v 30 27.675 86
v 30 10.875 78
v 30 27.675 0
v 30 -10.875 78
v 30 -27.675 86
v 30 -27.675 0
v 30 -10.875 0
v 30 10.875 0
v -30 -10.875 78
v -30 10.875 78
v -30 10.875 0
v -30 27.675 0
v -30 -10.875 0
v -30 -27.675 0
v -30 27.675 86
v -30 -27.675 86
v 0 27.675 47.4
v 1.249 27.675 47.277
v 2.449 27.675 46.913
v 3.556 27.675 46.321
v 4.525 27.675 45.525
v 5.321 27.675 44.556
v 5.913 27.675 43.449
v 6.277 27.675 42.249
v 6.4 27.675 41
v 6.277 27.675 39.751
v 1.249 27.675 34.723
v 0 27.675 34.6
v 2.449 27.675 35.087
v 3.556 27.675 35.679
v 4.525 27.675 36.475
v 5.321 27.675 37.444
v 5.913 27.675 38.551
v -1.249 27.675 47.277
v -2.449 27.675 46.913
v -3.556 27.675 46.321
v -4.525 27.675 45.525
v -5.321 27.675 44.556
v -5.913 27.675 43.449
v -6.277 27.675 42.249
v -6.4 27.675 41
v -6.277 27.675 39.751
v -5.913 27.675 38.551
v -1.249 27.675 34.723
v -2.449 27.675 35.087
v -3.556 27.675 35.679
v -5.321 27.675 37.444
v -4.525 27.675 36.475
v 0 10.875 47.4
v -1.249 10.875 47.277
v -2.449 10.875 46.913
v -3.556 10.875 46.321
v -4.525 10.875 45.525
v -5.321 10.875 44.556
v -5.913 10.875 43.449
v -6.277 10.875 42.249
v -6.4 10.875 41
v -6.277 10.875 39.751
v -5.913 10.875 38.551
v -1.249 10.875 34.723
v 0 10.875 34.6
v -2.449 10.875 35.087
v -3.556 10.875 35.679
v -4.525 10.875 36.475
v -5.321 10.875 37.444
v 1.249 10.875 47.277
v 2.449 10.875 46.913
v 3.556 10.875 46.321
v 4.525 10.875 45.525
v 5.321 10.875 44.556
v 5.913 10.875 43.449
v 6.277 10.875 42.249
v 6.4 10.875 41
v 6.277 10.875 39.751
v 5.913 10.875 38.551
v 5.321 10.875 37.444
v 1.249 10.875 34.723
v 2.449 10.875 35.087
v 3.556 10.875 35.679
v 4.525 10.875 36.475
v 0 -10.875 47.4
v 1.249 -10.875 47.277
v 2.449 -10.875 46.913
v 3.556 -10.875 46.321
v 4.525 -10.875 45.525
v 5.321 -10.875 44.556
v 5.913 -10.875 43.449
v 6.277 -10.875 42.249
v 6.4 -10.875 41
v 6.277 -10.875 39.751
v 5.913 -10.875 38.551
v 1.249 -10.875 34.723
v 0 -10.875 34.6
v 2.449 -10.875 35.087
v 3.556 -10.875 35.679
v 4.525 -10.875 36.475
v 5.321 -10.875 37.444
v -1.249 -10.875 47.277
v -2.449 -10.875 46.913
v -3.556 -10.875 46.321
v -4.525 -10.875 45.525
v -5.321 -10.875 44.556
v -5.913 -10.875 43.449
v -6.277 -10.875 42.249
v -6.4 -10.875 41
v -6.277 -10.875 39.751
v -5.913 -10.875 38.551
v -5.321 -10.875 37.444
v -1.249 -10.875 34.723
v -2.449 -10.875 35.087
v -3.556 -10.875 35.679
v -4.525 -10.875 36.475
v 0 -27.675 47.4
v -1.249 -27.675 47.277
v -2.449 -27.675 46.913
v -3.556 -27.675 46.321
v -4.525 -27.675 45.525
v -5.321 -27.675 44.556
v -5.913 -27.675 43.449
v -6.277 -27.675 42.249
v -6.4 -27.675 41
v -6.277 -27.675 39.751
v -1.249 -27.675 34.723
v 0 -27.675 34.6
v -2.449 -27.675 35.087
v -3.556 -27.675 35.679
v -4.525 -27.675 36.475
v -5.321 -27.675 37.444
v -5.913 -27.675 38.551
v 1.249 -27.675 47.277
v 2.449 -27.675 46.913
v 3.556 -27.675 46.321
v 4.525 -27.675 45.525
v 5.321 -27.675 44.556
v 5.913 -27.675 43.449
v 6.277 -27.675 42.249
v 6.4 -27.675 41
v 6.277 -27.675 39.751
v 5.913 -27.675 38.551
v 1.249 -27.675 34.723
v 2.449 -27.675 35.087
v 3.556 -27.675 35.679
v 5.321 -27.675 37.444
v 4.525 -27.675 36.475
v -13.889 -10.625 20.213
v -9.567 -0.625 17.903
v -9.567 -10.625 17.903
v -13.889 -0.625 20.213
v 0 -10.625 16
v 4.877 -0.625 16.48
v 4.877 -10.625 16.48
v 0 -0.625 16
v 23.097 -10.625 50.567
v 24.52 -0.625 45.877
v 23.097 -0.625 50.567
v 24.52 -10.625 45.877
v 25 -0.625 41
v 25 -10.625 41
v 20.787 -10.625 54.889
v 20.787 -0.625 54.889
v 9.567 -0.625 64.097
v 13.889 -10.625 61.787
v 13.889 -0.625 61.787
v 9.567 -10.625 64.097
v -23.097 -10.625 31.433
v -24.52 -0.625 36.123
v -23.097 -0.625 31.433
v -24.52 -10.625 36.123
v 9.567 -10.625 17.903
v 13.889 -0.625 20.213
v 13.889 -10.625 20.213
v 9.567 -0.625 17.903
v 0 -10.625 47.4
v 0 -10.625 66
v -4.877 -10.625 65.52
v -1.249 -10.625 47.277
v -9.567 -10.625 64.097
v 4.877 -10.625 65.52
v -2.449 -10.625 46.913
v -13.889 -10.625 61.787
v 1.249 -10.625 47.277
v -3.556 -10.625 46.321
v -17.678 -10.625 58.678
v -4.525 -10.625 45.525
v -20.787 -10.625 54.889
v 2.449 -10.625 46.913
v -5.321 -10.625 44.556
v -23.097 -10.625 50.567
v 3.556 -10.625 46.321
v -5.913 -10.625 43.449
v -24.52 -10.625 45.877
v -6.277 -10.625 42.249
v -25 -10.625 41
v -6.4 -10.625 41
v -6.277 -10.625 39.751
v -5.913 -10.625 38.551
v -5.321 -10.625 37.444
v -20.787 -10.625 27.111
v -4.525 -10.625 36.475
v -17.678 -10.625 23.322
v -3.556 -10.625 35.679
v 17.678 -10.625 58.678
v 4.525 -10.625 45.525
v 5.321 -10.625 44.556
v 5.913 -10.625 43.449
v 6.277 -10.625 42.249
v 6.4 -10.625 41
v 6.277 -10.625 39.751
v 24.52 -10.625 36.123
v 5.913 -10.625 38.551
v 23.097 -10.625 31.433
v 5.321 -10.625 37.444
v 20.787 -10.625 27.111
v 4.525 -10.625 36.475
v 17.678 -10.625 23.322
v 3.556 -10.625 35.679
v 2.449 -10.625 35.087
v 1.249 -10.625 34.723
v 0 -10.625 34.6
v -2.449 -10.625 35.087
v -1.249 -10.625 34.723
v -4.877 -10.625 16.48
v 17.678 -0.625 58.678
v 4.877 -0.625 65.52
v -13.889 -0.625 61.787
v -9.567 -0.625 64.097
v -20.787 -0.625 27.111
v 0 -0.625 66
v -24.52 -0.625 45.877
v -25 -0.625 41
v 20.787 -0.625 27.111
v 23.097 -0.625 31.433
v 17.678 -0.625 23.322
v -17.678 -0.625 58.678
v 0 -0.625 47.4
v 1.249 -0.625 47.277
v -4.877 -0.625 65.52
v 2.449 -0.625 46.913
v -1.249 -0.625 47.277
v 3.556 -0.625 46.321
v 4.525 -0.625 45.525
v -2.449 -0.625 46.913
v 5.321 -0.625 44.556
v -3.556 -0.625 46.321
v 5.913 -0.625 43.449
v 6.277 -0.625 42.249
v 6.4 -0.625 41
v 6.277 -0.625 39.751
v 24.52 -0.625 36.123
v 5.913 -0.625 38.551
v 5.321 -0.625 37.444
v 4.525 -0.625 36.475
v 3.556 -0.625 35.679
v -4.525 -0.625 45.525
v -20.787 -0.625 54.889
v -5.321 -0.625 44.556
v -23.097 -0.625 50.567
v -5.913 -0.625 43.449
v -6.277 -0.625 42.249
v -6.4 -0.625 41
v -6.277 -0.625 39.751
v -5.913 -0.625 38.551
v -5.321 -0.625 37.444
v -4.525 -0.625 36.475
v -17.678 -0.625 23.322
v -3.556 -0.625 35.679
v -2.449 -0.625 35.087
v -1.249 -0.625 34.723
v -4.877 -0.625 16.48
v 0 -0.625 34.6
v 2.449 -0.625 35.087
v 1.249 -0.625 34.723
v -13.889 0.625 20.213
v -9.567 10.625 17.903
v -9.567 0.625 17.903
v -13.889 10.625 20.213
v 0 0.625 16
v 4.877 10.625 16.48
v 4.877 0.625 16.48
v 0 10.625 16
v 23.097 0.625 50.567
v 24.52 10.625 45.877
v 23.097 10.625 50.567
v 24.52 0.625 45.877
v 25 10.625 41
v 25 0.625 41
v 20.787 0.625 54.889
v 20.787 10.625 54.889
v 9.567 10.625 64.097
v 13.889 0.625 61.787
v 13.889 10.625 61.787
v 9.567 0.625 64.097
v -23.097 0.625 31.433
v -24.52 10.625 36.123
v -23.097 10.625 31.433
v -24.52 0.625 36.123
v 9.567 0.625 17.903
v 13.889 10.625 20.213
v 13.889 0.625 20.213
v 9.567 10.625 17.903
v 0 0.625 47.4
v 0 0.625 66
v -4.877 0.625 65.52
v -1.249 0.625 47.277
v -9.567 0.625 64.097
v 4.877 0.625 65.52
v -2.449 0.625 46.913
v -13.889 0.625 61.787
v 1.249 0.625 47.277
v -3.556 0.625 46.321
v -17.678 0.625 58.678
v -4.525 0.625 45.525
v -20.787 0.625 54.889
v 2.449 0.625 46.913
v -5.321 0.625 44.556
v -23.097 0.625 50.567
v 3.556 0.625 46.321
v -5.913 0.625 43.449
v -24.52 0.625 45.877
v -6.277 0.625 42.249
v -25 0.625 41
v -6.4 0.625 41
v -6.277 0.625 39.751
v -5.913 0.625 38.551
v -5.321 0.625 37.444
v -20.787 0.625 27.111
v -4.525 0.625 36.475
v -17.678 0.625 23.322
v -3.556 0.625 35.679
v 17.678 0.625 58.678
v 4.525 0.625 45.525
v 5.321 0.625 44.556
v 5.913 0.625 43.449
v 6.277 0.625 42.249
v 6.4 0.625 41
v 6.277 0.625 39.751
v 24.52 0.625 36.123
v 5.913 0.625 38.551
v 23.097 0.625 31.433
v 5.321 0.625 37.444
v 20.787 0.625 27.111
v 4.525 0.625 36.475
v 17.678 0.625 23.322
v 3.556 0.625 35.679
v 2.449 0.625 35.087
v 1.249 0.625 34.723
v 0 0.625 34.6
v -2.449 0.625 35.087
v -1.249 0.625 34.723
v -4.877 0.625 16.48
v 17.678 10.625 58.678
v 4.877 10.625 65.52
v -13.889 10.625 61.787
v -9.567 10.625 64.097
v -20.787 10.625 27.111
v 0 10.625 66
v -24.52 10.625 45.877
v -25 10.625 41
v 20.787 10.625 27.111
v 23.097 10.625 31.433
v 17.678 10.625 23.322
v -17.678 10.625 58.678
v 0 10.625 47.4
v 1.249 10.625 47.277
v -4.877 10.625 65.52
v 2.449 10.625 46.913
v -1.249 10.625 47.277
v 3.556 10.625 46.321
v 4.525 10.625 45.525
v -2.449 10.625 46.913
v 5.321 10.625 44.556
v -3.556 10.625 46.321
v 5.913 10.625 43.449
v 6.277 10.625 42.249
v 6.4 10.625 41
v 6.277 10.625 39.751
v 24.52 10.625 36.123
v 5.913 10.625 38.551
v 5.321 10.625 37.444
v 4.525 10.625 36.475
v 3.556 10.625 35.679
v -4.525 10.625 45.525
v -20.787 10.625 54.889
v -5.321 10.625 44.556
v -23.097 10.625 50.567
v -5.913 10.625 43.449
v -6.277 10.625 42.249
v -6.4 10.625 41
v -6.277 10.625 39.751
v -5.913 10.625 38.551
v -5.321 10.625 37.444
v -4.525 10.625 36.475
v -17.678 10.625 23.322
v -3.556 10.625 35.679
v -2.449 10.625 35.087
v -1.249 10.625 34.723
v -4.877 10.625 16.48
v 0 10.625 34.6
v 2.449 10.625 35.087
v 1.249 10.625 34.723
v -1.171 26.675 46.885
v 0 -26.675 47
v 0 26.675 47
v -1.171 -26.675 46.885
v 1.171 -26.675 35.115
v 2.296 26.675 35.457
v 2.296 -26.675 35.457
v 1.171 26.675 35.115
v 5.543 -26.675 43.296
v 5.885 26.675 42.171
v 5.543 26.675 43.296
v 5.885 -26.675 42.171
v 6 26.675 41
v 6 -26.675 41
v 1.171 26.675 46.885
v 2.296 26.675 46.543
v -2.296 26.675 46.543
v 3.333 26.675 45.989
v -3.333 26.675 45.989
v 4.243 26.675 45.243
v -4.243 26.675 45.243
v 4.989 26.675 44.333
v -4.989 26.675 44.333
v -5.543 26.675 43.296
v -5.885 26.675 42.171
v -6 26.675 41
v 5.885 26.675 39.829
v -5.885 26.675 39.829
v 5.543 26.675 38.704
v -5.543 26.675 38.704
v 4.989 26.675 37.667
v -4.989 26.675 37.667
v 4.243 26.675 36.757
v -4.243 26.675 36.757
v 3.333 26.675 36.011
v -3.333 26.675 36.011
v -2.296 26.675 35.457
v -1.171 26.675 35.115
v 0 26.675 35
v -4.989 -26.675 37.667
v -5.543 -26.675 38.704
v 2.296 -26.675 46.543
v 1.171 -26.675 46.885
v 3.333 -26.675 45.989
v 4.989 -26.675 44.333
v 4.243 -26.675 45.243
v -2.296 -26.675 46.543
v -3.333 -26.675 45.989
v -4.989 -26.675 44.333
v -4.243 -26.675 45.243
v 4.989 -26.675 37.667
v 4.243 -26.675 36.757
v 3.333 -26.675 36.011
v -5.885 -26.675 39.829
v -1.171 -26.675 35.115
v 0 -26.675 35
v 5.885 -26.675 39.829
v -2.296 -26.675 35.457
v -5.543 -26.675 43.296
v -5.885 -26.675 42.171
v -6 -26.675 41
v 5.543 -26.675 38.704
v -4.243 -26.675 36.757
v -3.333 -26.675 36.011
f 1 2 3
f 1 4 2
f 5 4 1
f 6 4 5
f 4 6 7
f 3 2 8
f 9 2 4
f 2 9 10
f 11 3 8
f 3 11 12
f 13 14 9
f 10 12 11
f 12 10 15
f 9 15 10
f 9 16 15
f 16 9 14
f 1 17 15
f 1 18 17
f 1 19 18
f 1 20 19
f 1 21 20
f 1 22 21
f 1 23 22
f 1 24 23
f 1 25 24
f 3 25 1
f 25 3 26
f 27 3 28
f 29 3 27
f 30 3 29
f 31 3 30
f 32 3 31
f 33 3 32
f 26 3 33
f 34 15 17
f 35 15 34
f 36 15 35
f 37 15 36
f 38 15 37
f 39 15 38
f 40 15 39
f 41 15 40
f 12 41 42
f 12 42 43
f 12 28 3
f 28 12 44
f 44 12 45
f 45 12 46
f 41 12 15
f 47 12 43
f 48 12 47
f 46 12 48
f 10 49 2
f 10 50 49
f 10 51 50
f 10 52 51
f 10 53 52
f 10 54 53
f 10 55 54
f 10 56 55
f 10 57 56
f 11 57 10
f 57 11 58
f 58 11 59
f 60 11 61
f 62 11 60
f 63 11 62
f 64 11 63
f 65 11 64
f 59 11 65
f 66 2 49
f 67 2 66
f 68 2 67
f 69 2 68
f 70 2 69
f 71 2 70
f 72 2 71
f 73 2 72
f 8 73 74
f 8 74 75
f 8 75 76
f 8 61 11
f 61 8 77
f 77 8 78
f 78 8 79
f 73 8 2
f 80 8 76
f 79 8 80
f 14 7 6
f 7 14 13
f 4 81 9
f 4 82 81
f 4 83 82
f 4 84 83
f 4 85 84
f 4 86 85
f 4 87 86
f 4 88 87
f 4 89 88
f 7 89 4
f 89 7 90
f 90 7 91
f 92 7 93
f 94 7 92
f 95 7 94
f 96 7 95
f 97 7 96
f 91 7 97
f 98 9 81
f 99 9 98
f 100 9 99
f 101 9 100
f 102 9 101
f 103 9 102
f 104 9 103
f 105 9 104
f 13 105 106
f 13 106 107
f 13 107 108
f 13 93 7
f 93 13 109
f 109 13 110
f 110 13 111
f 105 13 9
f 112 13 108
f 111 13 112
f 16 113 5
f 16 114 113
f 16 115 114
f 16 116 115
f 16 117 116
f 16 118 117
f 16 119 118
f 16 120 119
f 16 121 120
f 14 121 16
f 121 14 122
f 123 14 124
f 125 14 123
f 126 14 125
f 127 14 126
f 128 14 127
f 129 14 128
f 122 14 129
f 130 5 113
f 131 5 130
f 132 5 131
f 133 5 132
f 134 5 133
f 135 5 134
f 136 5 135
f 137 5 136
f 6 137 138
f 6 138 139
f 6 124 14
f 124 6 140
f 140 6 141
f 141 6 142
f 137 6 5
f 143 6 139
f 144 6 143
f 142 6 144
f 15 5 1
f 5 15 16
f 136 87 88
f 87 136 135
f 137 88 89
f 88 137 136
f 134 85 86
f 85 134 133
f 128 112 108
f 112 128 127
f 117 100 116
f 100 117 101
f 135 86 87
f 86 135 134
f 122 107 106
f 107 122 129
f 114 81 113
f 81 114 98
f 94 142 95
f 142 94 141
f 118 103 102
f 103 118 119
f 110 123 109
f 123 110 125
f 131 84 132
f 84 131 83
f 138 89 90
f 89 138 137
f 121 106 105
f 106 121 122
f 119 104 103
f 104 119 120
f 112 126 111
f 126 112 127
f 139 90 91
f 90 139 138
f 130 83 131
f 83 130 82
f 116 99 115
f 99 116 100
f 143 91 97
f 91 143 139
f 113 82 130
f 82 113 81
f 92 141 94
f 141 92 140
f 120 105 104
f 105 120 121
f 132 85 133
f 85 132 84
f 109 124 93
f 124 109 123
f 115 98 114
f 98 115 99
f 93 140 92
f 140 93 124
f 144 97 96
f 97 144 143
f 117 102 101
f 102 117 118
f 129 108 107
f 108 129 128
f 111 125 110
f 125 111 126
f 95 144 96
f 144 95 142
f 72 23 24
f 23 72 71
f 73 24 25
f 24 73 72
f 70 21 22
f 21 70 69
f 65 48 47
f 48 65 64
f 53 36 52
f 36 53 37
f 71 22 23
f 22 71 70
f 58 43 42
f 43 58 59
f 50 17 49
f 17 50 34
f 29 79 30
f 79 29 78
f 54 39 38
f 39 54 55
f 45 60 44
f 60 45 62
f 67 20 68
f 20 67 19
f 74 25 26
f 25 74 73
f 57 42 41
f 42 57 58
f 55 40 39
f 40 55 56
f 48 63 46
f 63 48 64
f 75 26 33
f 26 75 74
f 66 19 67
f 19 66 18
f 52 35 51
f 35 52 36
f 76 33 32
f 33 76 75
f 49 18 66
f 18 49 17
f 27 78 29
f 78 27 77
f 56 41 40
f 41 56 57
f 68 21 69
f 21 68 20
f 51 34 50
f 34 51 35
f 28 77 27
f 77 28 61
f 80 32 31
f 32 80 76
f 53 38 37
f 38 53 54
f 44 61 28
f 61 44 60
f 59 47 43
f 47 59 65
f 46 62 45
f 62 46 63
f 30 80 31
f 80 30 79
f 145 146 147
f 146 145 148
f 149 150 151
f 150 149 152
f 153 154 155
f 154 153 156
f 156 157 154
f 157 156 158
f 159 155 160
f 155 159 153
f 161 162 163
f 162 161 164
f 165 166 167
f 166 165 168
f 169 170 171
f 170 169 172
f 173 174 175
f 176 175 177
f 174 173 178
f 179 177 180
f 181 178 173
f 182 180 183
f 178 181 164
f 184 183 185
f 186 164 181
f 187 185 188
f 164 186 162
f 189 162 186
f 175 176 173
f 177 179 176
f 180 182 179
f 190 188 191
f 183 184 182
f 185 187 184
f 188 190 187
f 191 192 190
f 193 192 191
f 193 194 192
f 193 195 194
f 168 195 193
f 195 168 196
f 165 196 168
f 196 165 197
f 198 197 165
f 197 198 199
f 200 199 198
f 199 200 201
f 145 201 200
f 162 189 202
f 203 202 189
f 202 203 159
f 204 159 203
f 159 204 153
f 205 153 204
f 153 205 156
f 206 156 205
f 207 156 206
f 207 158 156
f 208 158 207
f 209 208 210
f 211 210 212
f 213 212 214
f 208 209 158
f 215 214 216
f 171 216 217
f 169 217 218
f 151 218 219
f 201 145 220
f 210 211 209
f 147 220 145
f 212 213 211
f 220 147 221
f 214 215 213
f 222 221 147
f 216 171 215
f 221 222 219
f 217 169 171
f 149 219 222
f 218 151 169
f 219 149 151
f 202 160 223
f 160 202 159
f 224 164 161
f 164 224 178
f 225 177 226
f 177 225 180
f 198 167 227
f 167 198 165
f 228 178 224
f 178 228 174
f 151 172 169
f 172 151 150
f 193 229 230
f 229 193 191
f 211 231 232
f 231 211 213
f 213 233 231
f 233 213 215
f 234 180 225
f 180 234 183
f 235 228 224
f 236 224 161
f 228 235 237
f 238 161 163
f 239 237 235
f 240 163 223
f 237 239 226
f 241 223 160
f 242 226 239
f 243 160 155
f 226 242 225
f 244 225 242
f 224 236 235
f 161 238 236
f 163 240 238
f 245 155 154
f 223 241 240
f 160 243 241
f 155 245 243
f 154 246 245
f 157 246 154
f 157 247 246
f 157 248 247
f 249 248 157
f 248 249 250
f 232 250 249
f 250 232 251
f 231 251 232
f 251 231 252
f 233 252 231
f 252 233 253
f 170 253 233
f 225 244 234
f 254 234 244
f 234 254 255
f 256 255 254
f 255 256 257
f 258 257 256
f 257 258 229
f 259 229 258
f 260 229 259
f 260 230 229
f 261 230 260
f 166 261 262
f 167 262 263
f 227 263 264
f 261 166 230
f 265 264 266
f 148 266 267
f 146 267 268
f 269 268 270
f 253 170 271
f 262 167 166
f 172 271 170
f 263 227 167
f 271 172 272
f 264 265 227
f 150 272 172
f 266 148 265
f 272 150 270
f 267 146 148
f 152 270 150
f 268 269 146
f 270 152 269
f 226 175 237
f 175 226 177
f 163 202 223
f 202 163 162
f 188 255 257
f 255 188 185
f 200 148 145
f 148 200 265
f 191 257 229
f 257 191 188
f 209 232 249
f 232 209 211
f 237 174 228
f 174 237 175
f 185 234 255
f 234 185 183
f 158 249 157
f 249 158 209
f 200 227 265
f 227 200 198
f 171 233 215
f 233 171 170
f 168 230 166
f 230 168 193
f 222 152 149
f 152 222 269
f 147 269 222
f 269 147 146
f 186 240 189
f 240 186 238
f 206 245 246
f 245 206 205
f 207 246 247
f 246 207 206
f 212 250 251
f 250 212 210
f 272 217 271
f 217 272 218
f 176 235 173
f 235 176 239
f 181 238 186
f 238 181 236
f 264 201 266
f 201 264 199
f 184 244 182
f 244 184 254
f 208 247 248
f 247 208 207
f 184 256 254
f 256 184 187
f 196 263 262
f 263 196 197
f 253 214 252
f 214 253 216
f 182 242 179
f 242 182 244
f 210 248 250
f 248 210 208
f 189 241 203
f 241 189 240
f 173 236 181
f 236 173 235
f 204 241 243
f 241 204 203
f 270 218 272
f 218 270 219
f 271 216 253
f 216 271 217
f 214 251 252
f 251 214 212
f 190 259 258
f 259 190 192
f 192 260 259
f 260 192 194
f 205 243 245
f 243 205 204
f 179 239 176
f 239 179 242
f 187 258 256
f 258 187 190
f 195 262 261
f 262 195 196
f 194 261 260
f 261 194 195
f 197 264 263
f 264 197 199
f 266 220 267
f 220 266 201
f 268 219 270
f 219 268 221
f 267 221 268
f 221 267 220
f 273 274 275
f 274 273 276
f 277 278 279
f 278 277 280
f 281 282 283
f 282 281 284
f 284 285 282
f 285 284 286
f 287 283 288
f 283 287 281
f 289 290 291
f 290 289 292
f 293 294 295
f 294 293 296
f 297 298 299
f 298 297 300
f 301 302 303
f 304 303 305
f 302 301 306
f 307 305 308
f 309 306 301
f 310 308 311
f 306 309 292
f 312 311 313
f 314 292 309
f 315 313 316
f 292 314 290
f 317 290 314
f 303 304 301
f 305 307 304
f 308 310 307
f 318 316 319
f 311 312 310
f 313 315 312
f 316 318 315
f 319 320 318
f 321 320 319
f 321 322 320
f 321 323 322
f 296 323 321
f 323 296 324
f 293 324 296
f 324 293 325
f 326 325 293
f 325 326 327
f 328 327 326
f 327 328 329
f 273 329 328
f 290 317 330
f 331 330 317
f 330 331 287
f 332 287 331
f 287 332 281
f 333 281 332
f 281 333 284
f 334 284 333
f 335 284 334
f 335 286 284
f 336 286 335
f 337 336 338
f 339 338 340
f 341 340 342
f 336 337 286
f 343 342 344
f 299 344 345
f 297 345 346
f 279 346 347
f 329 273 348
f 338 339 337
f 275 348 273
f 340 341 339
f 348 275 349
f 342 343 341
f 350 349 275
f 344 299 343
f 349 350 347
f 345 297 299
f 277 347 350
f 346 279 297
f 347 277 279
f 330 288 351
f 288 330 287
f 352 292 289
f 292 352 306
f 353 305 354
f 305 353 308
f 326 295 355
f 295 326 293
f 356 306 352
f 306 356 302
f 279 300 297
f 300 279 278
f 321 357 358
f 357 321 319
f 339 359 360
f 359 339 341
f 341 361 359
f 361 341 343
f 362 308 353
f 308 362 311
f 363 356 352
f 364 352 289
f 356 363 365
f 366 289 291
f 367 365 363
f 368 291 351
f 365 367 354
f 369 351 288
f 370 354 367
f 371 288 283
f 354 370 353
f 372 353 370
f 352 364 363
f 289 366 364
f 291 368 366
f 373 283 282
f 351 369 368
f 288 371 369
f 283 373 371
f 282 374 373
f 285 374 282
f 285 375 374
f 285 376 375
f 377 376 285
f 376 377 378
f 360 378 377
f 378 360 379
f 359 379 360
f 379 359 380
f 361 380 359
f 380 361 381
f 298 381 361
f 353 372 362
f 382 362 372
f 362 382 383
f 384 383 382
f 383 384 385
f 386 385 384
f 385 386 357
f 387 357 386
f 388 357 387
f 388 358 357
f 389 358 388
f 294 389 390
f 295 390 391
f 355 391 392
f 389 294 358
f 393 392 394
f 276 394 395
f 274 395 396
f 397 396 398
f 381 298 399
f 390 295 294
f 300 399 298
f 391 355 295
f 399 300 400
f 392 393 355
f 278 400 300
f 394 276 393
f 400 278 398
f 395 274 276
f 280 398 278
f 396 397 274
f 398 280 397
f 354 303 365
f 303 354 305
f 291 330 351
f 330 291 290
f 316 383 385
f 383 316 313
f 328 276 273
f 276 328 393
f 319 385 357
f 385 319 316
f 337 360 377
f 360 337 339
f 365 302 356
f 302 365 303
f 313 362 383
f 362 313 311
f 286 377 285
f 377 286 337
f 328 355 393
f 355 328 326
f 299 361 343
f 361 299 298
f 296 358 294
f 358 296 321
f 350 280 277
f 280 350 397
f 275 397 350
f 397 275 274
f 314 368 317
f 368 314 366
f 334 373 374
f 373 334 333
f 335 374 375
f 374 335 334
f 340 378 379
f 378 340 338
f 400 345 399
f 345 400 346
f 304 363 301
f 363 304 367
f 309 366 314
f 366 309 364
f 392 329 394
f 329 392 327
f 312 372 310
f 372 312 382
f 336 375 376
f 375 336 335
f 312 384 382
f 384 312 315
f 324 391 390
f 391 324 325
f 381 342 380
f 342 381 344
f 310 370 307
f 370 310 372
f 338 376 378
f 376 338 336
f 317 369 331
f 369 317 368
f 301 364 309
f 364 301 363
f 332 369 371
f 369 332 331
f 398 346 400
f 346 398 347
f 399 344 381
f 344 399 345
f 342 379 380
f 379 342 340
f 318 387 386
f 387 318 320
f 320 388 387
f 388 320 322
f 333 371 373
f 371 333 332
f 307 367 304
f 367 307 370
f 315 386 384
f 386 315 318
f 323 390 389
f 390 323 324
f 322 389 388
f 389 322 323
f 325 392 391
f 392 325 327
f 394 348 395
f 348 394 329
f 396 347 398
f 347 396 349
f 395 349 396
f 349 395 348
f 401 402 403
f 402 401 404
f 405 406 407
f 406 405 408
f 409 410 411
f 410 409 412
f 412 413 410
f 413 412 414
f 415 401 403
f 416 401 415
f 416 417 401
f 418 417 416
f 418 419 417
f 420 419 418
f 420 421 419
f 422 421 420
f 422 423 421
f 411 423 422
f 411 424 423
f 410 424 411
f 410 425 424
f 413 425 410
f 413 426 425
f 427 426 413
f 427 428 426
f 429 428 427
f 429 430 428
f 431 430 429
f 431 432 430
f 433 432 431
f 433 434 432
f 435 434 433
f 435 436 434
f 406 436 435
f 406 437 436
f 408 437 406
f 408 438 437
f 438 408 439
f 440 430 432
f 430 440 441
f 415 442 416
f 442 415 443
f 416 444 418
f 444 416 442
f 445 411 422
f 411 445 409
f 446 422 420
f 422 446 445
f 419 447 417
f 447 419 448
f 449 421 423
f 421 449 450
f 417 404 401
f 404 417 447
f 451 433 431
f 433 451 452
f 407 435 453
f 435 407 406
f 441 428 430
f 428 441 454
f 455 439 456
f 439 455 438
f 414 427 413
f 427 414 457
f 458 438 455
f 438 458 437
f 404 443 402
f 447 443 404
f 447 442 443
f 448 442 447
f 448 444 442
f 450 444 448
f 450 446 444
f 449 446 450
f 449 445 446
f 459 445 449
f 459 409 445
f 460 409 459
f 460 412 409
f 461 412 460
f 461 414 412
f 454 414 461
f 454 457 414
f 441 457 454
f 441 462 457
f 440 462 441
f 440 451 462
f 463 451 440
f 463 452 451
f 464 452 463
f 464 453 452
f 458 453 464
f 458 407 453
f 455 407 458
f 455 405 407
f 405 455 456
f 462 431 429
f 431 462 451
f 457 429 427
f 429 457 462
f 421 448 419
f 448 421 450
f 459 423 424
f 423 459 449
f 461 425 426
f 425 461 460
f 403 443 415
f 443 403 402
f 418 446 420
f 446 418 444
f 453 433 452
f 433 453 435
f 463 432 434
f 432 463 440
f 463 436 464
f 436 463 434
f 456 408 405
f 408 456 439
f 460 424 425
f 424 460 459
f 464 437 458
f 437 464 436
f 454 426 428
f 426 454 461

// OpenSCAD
$fn = 32;

// ------------------------------------------------------------------------
// Trolley wheel set: wheels d50, fork 78 mm tall
// Every part is its own module, assembly() places every instance.
// ------------------------------------------------------------------------

// --- part 1 ---
module trolley_fork() {
  difference() {
    union() {
      translate([-30, 10.875, 0]) cube([60, 16.8, 78]);
      translate([-30, -27.675, 0]) cube([60, 16.8, 78]);
      translate([-30, -27.675, 78]) cube([60, 55.35, 8]);
    }
    translate([0, -19.275, 41]) rotate([90, 0, 0]) cylinder(h = 18.8, d = 12.8, center = true);
    translate([0, 19.275, 41]) rotate([90, 0, 0]) cylinder(h = 18.8, d = 12.8, center = true);
  }
}

// --- part 2 ---
module trolley_wheel() {
  difference() {
      translate([0, 0, 0]) cylinder(h = 10, d = 50);
      translate([0, 0, -1]) cylinder(h = 12, d = 12.8);
    }
}

// --- part 3 ---
module trolley_axle() {
  translate([0, 0, -26.675]) cylinder(h = 53.35, d = 12);
}

// --- assembly ---
module assembly() {
  color([0.80, 0.24, 0.20]) translate([0, 0, 0]) rotate([0, 0, 0]) trolley_fork();
  color([0.20, 0.45, 0.75]) translate([0, -0.625, 41]) rotate([90, 0, 0]) trolley_wheel();
  color([0.25, 0.62, 0.32]) translate([0, 10.625, 41]) rotate([90, 0, 0]) trolley_wheel();
  color([0.92, 0.70, 0.18]) translate([0, 0, 41]) rotate([90, 0, 0]) trolley_axle();
}

assembly();
